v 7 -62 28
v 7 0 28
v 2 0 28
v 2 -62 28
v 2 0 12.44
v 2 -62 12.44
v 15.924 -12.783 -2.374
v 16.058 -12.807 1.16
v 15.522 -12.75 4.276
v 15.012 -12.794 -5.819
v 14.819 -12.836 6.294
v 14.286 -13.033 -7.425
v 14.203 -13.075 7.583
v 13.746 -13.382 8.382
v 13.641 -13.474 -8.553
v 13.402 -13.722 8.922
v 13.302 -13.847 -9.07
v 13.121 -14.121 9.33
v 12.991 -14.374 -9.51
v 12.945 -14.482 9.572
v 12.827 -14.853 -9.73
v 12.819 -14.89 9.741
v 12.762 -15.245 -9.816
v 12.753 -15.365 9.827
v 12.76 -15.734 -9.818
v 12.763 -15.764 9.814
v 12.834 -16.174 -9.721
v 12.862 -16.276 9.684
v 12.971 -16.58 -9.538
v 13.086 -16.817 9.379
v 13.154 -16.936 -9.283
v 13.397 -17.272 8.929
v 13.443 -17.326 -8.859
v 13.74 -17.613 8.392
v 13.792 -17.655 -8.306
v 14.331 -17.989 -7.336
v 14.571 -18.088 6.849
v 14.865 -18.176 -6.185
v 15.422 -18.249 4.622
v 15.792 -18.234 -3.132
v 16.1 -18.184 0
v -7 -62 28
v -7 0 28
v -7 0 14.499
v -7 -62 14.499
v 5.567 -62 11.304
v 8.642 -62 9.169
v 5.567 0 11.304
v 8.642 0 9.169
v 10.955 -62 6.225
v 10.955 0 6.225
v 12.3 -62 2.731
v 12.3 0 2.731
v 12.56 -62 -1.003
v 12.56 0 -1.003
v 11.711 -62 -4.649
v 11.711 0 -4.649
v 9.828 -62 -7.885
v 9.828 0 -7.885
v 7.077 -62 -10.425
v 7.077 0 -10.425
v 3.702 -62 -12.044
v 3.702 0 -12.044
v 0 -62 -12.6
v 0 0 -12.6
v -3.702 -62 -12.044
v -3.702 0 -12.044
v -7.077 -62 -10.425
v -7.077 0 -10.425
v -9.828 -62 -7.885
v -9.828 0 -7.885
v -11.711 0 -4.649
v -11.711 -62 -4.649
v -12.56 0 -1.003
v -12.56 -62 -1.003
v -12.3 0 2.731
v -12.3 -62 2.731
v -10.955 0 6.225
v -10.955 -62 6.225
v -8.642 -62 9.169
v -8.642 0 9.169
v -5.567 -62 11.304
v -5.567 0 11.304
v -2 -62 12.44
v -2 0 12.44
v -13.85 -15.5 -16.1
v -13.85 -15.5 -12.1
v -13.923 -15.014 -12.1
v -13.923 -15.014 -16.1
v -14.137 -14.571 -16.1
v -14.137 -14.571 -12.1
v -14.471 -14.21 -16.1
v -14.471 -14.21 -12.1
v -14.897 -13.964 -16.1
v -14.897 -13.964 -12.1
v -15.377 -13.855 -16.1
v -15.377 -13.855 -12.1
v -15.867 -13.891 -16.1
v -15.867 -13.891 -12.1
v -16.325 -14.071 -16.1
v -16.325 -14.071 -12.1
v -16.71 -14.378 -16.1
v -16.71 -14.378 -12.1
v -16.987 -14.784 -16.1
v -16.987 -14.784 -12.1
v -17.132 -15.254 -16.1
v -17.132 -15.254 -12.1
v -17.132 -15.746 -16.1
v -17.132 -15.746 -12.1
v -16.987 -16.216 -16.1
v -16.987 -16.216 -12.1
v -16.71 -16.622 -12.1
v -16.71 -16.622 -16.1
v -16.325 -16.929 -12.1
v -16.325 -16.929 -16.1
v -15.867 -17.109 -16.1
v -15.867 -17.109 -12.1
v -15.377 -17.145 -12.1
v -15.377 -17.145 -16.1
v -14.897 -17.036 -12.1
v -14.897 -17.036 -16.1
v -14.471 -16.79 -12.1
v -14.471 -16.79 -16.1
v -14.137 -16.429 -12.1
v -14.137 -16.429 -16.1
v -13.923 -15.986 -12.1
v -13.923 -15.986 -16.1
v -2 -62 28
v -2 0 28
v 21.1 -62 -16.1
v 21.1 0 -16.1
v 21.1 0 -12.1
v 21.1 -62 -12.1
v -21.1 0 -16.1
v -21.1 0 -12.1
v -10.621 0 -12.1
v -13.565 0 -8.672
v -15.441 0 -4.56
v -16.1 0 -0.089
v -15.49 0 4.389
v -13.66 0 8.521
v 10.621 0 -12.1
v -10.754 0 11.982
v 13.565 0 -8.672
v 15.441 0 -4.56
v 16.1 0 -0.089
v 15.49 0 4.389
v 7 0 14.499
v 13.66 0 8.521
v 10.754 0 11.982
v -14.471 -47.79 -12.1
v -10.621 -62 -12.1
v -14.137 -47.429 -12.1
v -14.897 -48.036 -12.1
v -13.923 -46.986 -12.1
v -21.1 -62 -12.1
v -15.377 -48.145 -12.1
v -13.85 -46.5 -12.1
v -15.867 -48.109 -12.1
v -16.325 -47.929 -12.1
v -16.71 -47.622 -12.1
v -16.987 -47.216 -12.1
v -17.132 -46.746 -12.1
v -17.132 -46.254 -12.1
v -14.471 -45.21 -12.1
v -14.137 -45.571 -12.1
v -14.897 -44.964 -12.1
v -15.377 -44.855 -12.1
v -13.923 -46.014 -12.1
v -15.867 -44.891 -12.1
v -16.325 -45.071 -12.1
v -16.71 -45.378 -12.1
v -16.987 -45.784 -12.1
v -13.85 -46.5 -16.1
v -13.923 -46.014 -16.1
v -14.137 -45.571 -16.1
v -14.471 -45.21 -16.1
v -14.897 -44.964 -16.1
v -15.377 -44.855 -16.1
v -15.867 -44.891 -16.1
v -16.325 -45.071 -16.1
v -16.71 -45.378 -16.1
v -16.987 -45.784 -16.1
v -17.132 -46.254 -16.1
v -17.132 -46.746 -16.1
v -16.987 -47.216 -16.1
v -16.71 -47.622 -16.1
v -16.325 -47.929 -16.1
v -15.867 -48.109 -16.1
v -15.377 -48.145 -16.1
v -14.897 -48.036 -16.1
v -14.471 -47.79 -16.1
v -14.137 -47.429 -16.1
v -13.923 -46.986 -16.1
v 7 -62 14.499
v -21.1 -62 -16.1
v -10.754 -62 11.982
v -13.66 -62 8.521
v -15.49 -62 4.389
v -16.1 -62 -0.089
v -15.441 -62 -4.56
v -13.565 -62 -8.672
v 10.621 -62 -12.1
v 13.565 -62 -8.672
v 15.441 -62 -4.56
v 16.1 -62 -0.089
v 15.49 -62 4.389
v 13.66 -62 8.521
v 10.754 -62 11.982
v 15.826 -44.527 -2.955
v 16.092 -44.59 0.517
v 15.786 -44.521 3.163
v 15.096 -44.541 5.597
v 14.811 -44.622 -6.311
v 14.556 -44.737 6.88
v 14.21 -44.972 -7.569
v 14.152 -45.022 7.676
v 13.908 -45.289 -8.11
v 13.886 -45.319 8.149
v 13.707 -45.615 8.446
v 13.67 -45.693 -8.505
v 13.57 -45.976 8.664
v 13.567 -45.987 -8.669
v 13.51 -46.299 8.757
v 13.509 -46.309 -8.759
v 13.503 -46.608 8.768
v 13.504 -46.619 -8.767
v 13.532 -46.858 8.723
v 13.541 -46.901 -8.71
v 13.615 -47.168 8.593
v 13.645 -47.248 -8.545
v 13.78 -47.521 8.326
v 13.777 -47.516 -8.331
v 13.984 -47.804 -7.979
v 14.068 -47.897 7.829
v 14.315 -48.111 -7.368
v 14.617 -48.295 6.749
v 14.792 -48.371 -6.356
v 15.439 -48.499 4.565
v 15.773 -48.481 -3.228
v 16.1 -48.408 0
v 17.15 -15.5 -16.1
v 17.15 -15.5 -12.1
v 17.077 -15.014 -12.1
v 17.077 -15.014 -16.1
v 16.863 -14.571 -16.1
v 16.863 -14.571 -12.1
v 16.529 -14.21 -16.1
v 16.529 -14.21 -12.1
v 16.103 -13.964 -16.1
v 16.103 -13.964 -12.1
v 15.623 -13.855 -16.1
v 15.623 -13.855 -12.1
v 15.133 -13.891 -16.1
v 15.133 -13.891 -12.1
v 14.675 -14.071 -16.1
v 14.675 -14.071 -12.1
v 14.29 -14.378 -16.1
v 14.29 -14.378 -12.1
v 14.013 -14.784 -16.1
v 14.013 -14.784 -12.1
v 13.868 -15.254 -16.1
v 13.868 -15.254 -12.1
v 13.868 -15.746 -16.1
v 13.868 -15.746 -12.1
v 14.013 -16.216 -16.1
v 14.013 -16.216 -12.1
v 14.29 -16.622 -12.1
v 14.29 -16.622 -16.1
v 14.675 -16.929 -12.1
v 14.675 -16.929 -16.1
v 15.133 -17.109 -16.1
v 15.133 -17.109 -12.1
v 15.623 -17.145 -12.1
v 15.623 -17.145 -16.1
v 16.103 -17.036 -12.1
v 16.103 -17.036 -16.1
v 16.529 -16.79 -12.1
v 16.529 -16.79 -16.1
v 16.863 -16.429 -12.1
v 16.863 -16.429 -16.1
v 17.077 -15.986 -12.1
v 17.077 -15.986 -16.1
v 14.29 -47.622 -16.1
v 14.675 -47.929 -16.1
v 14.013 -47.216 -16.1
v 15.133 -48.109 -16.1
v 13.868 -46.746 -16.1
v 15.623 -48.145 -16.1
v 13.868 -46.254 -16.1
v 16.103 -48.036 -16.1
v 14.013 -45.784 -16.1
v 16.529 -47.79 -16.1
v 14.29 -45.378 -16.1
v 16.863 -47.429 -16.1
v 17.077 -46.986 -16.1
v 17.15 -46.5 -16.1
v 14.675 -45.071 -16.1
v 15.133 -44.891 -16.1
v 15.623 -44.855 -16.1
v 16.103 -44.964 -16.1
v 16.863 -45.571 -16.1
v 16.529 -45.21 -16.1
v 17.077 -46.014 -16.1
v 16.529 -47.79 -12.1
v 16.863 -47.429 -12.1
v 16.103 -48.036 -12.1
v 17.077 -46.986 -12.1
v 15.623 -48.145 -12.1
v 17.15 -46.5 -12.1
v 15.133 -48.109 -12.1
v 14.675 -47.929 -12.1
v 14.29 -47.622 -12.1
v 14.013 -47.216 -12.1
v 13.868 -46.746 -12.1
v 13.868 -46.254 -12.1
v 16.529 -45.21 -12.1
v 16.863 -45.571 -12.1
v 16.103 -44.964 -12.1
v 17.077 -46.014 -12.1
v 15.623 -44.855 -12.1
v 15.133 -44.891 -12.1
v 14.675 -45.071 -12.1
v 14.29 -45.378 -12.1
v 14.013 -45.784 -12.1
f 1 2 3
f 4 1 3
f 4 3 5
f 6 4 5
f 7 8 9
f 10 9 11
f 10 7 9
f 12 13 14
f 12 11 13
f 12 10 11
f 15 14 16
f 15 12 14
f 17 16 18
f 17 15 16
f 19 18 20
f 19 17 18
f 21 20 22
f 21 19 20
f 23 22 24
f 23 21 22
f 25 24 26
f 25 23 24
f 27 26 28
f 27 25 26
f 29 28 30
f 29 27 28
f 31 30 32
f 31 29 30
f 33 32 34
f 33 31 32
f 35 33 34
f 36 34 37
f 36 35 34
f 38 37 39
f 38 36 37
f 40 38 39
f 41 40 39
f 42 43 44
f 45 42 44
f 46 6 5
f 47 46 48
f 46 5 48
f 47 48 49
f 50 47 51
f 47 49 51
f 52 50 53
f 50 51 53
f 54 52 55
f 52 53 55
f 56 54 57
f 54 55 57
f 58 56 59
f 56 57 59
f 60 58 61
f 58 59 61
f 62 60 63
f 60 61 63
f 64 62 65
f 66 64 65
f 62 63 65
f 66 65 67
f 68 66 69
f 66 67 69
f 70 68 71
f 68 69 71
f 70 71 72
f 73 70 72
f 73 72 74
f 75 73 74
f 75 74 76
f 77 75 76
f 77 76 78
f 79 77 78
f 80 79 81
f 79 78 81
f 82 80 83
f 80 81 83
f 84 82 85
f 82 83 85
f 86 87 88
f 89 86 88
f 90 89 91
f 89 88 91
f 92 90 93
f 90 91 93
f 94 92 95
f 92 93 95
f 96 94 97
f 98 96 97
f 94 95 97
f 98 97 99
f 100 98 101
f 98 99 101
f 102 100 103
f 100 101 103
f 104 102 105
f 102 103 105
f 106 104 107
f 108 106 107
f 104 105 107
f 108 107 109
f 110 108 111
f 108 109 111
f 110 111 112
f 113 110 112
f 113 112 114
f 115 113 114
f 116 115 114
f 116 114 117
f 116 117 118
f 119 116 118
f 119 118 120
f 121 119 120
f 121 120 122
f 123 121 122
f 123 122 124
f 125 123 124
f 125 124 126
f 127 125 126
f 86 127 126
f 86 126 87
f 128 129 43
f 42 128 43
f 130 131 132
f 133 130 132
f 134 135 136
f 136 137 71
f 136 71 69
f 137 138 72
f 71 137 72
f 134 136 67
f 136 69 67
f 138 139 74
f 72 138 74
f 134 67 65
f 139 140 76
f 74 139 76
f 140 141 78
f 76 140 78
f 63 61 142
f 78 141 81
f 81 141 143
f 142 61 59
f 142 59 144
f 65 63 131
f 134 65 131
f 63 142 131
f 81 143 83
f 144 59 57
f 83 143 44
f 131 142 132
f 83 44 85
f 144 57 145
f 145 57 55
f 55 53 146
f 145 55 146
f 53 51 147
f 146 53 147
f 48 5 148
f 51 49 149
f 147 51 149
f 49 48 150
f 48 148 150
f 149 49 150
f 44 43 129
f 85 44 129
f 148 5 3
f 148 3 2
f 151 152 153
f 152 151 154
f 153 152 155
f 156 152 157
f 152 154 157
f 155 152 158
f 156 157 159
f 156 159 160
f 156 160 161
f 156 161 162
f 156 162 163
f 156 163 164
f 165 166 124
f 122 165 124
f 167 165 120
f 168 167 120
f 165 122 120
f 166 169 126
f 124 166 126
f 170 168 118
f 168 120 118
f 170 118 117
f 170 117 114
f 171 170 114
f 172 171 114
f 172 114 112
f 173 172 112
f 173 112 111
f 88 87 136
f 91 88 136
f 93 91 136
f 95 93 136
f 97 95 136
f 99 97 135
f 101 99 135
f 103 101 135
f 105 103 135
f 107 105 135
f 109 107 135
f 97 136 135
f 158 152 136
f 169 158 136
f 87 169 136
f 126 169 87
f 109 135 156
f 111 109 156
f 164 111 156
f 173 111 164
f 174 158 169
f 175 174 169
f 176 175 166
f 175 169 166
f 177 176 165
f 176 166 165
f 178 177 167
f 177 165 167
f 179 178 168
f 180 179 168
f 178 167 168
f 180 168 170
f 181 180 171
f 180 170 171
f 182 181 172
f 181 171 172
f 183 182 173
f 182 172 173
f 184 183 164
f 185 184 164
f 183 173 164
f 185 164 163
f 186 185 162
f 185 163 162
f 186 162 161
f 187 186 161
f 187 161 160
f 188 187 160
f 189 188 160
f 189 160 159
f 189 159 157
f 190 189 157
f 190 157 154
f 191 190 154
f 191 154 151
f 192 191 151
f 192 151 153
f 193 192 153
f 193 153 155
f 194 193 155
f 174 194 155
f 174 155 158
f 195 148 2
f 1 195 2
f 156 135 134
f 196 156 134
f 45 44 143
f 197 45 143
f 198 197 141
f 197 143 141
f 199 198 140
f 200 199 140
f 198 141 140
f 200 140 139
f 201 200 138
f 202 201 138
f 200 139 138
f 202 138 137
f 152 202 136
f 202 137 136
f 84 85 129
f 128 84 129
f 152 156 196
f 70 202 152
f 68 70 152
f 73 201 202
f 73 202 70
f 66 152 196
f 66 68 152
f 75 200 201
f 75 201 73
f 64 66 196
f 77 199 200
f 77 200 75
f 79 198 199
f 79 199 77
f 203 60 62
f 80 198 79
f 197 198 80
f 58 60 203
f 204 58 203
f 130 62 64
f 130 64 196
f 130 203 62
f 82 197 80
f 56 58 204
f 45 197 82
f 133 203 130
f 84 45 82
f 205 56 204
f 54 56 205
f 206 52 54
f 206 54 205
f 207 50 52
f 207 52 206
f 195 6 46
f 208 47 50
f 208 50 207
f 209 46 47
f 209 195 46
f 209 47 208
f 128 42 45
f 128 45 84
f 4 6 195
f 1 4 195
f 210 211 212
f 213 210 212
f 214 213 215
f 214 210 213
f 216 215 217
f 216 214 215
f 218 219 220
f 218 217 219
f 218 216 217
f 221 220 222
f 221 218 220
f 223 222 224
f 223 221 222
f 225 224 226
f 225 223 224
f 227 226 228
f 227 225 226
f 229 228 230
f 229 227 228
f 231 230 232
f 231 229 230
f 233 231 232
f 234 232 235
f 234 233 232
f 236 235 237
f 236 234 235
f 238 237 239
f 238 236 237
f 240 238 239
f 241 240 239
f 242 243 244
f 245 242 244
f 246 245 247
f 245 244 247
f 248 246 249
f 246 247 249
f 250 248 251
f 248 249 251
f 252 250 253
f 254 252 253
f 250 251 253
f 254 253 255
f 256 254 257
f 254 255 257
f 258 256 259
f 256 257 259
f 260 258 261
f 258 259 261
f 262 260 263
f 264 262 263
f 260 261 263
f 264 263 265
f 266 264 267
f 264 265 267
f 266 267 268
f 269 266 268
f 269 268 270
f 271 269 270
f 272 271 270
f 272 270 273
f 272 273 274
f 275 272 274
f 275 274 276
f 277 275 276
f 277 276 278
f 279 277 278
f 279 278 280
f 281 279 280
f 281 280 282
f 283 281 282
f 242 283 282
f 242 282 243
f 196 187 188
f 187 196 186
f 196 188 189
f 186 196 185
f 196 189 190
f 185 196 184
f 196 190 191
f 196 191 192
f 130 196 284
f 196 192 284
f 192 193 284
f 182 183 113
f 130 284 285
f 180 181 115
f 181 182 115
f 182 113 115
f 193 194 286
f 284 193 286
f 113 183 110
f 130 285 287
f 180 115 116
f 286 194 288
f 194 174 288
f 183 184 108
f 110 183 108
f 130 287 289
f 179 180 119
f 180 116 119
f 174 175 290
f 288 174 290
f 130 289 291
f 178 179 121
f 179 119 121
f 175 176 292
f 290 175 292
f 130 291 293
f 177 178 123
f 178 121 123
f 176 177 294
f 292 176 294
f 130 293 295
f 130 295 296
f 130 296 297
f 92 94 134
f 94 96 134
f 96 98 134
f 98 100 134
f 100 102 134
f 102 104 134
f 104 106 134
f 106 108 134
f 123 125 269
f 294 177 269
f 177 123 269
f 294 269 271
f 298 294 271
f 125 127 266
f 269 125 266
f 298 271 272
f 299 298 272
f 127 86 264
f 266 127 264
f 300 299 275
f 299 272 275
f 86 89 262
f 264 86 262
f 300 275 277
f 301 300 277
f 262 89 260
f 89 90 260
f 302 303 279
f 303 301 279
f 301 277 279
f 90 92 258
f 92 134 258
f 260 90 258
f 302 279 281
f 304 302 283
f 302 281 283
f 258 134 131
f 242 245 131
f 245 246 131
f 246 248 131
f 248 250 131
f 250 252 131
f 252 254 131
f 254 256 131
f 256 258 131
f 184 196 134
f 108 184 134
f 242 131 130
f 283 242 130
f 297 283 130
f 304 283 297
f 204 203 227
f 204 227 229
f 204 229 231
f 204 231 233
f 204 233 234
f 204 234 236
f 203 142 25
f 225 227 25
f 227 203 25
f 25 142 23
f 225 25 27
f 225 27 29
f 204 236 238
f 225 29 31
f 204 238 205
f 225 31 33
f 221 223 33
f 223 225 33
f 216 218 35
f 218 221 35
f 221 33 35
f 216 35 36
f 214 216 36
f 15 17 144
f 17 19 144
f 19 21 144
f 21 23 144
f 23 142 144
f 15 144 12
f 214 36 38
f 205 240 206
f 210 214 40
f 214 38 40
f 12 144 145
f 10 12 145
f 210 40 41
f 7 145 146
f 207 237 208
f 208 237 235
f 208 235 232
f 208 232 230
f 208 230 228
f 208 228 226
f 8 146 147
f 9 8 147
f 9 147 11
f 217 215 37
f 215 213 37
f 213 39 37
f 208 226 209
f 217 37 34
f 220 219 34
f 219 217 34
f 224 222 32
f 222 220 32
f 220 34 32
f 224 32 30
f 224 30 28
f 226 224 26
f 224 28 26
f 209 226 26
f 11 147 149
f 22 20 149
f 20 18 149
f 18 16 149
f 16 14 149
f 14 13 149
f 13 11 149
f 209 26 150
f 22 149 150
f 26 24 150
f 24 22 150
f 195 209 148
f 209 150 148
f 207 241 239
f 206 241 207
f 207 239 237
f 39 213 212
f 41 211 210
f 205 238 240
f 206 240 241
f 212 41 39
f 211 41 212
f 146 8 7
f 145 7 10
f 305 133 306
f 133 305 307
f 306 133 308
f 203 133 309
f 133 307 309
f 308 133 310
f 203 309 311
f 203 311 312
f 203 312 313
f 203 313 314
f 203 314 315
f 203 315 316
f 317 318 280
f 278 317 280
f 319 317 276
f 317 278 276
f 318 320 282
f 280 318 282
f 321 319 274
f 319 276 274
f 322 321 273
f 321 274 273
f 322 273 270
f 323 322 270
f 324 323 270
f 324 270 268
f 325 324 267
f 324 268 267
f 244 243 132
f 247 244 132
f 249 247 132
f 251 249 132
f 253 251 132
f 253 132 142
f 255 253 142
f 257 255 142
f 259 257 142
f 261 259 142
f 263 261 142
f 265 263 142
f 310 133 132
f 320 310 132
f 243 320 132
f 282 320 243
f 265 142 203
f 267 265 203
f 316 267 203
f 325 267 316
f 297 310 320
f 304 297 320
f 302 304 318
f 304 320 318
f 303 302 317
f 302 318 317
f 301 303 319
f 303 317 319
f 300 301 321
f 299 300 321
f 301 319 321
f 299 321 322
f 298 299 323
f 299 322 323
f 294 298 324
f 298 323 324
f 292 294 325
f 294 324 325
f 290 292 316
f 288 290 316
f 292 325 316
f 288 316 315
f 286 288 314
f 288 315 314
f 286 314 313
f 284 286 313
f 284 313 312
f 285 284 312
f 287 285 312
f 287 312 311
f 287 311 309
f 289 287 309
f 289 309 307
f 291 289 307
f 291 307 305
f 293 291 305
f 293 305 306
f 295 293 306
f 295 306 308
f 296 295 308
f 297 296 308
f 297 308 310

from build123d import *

# Parameters (mm, degrees)
F1_DEPTH = 62
F2_R     = 1.65
F3_DEPTH = 25
F4_R     = 2
F4_R_2   = 2.75
F5_DEPTH = 25


with BuildPart() as f1:
    # F0 (on Front) → F1 (new body)
    with BuildSketch(Plane.XZ):
        with BuildLine():
            ThreePointArc((2, 12.440257), (0, -12.6), (-2, 12.440257))
            Line((-2, 12.440257), (-2, 28))
            Line((-2, 28), (-7, 28))
            Line((-7, 28), (-7, 14.498621))
            ThreePointArc((-7, 14.498621), (-15.952875, 2.171583), (-10.620734, -12.1))
            Line((-10.620734, -12.1), (-21.1, -12.1))
            Line((-21.1, -12.1), (-21.1, -16.1))
            Line((-21.1, -16.1), (0, -16.1))
            Line((0, -16.1), (21.1, -16.1))
            Line((21.1, -16.1), (21.1, -12.1))
            Line((21.1, -12.1), (10.620734, -12.1))
            ThreePointArc((10.620734, -12.1), (15.952875, 2.171583), (7, 14.498621))
            Line((7, 14.498621), (7, 28))
            Line((7, 28), (2, 28))
            Line((2, 28), (2, 12.440257))
        make_face()
    extrude(amount=F1_DEPTH)

    # F2 (on face) → F3 (cut)
    with BuildSketch(Plane.XY.offset(-12.1)):
        with Locations((15.5, -15.5)):
            Circle(F2_R)
        with Locations((15.5, -46.5)):
            Circle(F2_R)
        with Locations((-15.5, -15.5)):
            Circle(F2_R)
        with Locations((-15.5, -46.5)):
            Circle(F2_R)
    extrude(amount=-F3_DEPTH, mode=Mode.SUBTRACT)

    # F4 (on face) → F5 (cut)
    with BuildSketch(Plane.XY.offset(-12.1)):
        with Locations((15.5, -46.5)):
            Circle(F4_R)
        with Locations((15.5, -15.5)):
            Circle(F4_R_2)
    extrude(amount=F5_DEPTH, mode=Mode.SUBTRACT)


solid = f1.part
